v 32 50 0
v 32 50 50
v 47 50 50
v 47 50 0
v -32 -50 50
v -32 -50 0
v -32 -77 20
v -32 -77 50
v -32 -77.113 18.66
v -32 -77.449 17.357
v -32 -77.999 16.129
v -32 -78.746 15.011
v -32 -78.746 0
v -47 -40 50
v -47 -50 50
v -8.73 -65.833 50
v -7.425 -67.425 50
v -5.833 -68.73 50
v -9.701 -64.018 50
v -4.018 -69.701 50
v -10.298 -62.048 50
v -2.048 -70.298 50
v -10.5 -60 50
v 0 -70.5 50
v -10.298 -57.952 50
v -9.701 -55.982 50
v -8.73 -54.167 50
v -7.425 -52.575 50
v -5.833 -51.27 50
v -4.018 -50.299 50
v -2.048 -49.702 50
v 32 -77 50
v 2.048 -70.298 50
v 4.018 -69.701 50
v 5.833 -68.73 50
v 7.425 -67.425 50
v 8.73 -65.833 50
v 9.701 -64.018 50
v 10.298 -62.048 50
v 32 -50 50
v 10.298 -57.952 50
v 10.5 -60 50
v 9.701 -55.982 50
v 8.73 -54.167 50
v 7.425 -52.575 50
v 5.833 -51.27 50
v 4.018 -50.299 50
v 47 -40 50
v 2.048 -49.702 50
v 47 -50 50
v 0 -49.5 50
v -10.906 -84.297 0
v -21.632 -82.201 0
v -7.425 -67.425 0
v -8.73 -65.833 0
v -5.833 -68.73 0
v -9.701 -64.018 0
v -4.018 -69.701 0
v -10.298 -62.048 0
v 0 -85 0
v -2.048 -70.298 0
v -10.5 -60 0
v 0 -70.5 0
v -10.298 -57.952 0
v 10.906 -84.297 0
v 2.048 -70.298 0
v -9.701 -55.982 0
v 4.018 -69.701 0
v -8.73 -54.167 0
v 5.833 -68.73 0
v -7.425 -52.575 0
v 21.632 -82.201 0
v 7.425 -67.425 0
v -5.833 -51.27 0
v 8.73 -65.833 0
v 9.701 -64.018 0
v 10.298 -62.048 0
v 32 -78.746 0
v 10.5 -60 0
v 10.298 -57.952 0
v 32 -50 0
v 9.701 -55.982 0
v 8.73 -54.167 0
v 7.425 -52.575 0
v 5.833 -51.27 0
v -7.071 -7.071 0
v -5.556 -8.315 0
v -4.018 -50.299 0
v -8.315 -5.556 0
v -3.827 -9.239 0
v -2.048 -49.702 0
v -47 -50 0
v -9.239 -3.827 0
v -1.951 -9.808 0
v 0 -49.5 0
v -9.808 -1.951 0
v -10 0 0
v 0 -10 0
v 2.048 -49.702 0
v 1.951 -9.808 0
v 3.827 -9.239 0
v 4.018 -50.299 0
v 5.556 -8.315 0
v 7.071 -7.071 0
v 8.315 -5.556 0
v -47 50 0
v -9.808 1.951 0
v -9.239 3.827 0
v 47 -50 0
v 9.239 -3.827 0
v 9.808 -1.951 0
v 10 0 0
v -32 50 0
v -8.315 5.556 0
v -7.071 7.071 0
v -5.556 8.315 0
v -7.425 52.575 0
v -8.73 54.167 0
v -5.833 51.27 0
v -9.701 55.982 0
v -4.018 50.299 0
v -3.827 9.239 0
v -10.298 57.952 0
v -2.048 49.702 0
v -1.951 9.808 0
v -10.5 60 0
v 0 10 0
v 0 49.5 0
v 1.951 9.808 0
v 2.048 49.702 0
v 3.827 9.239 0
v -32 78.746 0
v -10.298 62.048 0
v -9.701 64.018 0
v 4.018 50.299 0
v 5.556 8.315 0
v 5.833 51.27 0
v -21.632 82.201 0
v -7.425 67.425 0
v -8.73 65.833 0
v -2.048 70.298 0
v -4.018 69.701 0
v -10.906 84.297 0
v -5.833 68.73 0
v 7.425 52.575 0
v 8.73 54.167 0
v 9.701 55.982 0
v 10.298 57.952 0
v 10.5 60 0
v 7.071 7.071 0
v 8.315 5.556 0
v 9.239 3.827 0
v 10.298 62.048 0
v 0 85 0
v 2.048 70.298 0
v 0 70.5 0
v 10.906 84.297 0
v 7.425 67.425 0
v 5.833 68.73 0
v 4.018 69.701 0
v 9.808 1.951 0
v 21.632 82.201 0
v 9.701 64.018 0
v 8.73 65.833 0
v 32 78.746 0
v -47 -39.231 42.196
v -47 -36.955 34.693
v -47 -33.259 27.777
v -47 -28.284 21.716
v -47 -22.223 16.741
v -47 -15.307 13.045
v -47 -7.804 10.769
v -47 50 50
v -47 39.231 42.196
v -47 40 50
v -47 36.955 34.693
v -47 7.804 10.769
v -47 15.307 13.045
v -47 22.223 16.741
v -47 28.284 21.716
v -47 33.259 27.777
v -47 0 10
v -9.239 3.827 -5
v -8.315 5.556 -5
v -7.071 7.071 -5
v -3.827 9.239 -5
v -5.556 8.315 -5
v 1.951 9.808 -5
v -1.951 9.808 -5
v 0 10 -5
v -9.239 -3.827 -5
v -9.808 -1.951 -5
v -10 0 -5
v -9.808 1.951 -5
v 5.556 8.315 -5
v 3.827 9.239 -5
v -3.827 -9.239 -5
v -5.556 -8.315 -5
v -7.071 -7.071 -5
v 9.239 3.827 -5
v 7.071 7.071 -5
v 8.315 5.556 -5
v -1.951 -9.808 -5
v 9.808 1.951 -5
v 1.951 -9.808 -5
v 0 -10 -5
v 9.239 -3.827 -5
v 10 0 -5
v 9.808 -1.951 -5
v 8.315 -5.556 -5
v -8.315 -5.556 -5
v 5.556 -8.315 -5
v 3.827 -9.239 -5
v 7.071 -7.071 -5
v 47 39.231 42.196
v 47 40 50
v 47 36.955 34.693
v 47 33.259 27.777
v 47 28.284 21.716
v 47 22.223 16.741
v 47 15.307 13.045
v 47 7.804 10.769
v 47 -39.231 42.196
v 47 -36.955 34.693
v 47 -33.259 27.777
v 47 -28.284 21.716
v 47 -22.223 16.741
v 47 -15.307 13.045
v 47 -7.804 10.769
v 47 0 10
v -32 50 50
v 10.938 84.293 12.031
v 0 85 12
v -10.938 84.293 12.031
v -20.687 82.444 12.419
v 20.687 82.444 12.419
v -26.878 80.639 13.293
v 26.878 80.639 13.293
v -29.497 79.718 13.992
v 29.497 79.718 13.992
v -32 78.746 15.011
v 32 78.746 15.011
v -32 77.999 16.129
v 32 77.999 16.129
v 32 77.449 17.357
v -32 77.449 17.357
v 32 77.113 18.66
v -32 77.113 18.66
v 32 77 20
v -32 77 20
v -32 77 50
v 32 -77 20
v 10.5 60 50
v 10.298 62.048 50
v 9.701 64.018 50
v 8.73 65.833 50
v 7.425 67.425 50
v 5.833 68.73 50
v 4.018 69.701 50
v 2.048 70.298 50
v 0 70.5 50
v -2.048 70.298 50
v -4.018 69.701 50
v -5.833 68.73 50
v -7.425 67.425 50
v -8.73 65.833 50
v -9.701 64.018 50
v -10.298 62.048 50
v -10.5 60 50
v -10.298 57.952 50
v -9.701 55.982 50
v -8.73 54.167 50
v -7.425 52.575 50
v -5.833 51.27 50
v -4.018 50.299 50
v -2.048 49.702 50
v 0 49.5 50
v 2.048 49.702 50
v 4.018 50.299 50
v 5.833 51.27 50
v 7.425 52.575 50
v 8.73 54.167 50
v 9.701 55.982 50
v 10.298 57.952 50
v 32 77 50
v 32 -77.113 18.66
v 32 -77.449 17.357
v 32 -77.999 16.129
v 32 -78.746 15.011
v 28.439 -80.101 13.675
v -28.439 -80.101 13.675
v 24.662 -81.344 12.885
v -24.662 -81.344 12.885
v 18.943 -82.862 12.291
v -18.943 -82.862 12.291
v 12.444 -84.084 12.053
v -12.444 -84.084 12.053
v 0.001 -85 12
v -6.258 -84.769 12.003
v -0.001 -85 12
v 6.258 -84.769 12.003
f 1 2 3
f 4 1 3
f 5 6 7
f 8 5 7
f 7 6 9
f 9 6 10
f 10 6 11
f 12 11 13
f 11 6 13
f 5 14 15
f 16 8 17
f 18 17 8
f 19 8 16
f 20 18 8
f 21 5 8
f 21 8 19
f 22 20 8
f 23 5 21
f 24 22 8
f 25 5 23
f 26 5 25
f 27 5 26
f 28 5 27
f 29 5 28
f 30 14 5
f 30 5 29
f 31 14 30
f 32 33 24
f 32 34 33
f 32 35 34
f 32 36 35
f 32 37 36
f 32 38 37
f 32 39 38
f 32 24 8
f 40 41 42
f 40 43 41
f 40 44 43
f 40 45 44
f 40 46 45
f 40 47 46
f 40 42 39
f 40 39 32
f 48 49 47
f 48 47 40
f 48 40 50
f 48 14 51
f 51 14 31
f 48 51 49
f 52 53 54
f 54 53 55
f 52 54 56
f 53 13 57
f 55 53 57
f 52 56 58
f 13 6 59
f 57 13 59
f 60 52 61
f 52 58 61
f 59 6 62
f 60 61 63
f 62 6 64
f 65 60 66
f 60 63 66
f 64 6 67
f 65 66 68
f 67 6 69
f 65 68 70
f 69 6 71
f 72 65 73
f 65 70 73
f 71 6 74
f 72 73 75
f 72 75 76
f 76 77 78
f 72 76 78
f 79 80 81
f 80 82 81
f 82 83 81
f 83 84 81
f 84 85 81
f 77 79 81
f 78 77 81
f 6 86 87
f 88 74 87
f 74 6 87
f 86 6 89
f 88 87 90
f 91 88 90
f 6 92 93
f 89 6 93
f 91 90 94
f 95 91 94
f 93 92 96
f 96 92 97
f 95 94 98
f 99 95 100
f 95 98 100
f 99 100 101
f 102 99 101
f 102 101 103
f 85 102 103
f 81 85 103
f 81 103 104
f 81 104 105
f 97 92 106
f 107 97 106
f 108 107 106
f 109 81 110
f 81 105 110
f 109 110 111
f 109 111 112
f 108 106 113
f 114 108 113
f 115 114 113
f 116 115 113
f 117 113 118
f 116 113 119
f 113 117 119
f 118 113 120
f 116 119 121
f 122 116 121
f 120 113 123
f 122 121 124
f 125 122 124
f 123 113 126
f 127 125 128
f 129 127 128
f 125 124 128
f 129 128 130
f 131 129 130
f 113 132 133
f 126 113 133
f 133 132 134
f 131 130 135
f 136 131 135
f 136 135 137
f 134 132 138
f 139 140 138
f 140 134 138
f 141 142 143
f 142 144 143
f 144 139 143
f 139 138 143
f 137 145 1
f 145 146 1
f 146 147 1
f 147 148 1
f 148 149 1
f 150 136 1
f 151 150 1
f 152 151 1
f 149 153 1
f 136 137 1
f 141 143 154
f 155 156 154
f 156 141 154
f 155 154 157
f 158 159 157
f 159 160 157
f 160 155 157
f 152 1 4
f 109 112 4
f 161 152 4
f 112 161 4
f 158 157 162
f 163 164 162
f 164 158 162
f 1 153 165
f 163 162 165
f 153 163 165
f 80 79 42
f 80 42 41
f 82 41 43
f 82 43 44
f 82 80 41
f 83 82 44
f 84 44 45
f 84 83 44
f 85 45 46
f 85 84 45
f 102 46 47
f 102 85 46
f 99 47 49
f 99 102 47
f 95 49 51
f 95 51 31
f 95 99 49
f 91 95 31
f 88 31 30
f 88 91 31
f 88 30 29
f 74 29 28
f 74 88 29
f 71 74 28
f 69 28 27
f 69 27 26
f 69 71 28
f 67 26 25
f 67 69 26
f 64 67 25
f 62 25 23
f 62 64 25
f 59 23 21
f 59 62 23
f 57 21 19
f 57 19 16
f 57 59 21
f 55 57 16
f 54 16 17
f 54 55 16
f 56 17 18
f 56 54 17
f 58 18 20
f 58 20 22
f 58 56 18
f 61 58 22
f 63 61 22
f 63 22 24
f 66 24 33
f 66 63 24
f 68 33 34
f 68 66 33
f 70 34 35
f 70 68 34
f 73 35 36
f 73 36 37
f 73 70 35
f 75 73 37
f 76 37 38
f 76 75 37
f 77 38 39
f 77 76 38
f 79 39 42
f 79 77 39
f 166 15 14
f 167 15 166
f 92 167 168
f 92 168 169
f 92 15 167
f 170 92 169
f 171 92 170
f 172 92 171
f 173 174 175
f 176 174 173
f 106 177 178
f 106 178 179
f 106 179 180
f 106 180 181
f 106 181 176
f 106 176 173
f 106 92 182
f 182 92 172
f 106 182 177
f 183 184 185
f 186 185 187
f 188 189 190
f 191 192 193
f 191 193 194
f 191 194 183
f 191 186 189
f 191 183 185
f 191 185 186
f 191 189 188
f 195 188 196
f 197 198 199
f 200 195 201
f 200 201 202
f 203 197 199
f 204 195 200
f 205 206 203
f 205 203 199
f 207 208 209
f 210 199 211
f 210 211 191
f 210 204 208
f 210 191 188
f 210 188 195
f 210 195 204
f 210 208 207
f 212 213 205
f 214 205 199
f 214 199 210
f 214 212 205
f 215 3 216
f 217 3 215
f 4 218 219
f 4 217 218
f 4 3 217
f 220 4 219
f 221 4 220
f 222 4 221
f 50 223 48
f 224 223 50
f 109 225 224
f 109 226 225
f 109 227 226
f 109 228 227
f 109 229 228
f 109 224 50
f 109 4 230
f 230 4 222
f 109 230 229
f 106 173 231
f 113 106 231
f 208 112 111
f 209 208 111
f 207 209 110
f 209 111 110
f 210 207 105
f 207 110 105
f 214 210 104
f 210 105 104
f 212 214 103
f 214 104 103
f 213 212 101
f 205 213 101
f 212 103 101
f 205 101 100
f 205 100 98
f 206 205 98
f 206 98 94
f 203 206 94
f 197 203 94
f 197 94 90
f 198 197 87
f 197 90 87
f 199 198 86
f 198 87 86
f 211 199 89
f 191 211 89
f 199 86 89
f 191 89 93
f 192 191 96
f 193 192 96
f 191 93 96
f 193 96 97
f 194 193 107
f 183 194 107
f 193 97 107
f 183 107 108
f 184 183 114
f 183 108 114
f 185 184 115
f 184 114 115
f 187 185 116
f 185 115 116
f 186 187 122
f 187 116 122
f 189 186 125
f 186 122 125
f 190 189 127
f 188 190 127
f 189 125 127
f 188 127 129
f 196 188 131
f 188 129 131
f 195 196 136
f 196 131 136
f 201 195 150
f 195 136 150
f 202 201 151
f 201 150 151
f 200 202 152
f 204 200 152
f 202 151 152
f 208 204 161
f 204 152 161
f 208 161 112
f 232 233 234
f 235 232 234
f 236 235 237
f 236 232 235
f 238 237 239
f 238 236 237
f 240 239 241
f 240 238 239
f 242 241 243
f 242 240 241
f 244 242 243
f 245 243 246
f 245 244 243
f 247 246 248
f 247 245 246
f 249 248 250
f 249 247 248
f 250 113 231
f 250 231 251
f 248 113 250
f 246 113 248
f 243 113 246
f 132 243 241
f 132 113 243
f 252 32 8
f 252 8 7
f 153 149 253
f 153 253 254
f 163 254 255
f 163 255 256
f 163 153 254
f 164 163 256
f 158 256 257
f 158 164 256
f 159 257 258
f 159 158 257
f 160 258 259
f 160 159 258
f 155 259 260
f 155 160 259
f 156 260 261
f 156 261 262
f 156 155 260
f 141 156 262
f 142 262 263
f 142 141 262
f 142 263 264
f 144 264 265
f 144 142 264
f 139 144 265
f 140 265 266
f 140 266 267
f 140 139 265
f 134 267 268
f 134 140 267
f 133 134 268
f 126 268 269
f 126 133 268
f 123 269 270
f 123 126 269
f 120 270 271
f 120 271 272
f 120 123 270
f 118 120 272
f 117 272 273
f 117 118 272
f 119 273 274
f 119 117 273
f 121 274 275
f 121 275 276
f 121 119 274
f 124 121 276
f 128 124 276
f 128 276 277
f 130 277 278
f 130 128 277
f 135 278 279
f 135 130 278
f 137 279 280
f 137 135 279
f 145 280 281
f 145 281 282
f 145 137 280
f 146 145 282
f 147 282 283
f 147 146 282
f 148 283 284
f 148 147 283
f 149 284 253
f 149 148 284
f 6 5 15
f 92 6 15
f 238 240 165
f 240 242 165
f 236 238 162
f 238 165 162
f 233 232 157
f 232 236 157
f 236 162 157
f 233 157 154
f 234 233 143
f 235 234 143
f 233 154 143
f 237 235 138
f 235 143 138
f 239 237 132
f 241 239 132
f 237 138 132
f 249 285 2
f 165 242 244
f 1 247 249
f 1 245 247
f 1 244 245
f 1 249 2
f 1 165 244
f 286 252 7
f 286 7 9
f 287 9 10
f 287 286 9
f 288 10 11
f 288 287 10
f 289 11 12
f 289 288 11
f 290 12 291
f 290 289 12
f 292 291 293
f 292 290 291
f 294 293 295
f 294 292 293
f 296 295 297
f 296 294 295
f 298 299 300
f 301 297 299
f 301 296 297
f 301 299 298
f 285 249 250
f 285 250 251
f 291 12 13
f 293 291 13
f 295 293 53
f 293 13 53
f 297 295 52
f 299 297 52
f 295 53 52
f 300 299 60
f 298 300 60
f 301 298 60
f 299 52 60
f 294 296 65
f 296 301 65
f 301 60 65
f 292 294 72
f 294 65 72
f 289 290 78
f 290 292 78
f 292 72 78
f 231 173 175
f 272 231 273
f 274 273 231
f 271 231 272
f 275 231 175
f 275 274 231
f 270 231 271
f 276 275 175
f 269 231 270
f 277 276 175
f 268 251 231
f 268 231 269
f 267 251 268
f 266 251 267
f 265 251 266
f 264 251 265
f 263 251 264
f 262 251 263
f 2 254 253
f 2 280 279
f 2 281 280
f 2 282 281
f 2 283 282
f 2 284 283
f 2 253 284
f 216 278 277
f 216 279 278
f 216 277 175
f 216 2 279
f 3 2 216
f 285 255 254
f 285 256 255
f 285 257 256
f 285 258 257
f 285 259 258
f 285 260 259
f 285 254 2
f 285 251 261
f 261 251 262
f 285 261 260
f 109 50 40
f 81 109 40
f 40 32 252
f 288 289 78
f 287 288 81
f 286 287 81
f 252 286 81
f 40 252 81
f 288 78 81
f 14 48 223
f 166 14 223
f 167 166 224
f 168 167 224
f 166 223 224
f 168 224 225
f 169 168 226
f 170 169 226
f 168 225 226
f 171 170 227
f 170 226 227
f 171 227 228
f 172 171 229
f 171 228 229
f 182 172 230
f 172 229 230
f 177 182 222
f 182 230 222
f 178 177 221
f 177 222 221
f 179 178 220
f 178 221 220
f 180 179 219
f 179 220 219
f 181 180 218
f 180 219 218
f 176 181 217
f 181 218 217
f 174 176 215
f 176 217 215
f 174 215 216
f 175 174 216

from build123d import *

# Parameters (mm, degrees)
SKETCH1_R           = 10.5
SKETCH1_W           = 94
SKETCH1_H           = 80
BOSS_EXTRUDE1_DEPTH = 50
CUT_EXTRUDE1_DEPTH  = 137.238761004
SKETCH3_R           = 10
BOSS_EXTRUDE2_DEPTH = 5


with BuildPart() as part:
    # Sketch1 → Boss-Extrude1 (new body)
    # profile 1 of 5: a face of its own
    with BuildSketch(Plane.XY):
        with BuildLine():
            Line((32, 67.830671528), (32, 78.74642849))
            ThreePointArc((32, 78.74642849), (0, 85), (-32, 78.74642849))
            Line((-32, 78.74642849), (-32, 67.830671528))
            ThreePointArc((-32, 67.830671528), (0, 75), (32, 67.830671528))
        make_face()
    # profile 2 of 5: a face of its own
    with BuildSketch(Plane.XY):
        with BuildLine():
            Line((32, 67.830671528), (32, 50))
            Line((32, 50), (47, 50))
            Line((47, 50), (47, 40))
            Line((47, 40), (-47, 40))
            Line((-47, 40), (-47, 50))
            Line((-47, 50), (-32, 50))
            Line((-32, 50), (-32, 67.830671528))
            ThreePointArc((-32, 67.830671528), (0, 75), (32, 67.830671528))
        make_face()
        with Locations((0, 60)):
            Circle(SKETCH1_R, mode=Mode.SUBTRACT)
    # profile 3 of 5: a face of its own
    with BuildSketch(Plane.XY):
        Rectangle(SKETCH1_W, SKETCH1_H)
    # profile 4 of 5: a face of its own
    with BuildSketch(Plane.XY):
        with BuildLine():
            Line((-32, -67.830671528), (-32, -50))
            Line((-32, -50), (-47, -50))
            Line((-47, -50), (-47, -40))
            Line((-47, -40), (47, -40))
            Line((47, -40), (47, -50))
            Line((47, -50), (32, -50))
            Line((32, -50), (32, -67.830671528))
            ThreePointArc((32, -67.830671528), (0, -75), (-32, -67.830671528))
        make_face()
        with Locations((0, -60)):
            Circle(SKETCH1_R, mode=Mode.SUBTRACT)
    # profile 5 of 5: a face of its own
    with BuildSketch(Plane.XY):
        with BuildLine():
            Line((-32, -67.830671528), (-32, -78.74642849))
            ThreePointArc((-32, -78.74642849), (0, -85), (32, -78.74642849))
            Line((32, -78.74642849), (32, -67.830671528))
            ThreePointArc((32, -67.830671528), (0, -75), (-32, -67.830671528))
        make_face()
    extrude(amount=BOSS_EXTRUDE1_DEPTH)

    # Sketch2 → Cut-Extrude1 (cut, through all)
    with BuildSketch(Plane(origin=(47, 0, 0), x_dir=(0, 0, -1), z_dir=(1, 0, 0))):
        with BuildLine():
            Line((-50, 40), (-50, -40))
            ThreePointArc((-50, -40), (-10, 0), (-50, 40))
        make_face()
        with BuildLine():
            Line((-50, -77), (-20, -77))
            ThreePointArc((-20, -77), (-14.343145751, -79.343145751), (-12, -85))
            Line((-12, -85), (-50, -85))
            Line((-50, -85), (-50, -77))
        make_face()
        with BuildLine():
            Line((-50, 85), (-12, 85))
            ThreePointArc((-12, 85), (-14.343145751, 79.343145751), (-20, 77))
            Line((-20, 77), (-50, 77))
            Line((-50, 77), (-50, 85))
        make_face()
    extrude(amount=-CUT_EXTRUDE1_DEPTH, mode=Mode.SUBTRACT)

    # Sketch3 → Boss-Extrude2 (add)
    with BuildSketch(Plane(origin=(0, 0, 0), x_dir=(-1, 0, 0), z_dir=(0, 0, -1))):
        with Locations(Location((0, 0, 0), (0, 0, 180))):
            Circle(SKETCH3_R)
    extrude(amount=BOSS_EXTRUDE2_DEPTH)


solid = part.part
